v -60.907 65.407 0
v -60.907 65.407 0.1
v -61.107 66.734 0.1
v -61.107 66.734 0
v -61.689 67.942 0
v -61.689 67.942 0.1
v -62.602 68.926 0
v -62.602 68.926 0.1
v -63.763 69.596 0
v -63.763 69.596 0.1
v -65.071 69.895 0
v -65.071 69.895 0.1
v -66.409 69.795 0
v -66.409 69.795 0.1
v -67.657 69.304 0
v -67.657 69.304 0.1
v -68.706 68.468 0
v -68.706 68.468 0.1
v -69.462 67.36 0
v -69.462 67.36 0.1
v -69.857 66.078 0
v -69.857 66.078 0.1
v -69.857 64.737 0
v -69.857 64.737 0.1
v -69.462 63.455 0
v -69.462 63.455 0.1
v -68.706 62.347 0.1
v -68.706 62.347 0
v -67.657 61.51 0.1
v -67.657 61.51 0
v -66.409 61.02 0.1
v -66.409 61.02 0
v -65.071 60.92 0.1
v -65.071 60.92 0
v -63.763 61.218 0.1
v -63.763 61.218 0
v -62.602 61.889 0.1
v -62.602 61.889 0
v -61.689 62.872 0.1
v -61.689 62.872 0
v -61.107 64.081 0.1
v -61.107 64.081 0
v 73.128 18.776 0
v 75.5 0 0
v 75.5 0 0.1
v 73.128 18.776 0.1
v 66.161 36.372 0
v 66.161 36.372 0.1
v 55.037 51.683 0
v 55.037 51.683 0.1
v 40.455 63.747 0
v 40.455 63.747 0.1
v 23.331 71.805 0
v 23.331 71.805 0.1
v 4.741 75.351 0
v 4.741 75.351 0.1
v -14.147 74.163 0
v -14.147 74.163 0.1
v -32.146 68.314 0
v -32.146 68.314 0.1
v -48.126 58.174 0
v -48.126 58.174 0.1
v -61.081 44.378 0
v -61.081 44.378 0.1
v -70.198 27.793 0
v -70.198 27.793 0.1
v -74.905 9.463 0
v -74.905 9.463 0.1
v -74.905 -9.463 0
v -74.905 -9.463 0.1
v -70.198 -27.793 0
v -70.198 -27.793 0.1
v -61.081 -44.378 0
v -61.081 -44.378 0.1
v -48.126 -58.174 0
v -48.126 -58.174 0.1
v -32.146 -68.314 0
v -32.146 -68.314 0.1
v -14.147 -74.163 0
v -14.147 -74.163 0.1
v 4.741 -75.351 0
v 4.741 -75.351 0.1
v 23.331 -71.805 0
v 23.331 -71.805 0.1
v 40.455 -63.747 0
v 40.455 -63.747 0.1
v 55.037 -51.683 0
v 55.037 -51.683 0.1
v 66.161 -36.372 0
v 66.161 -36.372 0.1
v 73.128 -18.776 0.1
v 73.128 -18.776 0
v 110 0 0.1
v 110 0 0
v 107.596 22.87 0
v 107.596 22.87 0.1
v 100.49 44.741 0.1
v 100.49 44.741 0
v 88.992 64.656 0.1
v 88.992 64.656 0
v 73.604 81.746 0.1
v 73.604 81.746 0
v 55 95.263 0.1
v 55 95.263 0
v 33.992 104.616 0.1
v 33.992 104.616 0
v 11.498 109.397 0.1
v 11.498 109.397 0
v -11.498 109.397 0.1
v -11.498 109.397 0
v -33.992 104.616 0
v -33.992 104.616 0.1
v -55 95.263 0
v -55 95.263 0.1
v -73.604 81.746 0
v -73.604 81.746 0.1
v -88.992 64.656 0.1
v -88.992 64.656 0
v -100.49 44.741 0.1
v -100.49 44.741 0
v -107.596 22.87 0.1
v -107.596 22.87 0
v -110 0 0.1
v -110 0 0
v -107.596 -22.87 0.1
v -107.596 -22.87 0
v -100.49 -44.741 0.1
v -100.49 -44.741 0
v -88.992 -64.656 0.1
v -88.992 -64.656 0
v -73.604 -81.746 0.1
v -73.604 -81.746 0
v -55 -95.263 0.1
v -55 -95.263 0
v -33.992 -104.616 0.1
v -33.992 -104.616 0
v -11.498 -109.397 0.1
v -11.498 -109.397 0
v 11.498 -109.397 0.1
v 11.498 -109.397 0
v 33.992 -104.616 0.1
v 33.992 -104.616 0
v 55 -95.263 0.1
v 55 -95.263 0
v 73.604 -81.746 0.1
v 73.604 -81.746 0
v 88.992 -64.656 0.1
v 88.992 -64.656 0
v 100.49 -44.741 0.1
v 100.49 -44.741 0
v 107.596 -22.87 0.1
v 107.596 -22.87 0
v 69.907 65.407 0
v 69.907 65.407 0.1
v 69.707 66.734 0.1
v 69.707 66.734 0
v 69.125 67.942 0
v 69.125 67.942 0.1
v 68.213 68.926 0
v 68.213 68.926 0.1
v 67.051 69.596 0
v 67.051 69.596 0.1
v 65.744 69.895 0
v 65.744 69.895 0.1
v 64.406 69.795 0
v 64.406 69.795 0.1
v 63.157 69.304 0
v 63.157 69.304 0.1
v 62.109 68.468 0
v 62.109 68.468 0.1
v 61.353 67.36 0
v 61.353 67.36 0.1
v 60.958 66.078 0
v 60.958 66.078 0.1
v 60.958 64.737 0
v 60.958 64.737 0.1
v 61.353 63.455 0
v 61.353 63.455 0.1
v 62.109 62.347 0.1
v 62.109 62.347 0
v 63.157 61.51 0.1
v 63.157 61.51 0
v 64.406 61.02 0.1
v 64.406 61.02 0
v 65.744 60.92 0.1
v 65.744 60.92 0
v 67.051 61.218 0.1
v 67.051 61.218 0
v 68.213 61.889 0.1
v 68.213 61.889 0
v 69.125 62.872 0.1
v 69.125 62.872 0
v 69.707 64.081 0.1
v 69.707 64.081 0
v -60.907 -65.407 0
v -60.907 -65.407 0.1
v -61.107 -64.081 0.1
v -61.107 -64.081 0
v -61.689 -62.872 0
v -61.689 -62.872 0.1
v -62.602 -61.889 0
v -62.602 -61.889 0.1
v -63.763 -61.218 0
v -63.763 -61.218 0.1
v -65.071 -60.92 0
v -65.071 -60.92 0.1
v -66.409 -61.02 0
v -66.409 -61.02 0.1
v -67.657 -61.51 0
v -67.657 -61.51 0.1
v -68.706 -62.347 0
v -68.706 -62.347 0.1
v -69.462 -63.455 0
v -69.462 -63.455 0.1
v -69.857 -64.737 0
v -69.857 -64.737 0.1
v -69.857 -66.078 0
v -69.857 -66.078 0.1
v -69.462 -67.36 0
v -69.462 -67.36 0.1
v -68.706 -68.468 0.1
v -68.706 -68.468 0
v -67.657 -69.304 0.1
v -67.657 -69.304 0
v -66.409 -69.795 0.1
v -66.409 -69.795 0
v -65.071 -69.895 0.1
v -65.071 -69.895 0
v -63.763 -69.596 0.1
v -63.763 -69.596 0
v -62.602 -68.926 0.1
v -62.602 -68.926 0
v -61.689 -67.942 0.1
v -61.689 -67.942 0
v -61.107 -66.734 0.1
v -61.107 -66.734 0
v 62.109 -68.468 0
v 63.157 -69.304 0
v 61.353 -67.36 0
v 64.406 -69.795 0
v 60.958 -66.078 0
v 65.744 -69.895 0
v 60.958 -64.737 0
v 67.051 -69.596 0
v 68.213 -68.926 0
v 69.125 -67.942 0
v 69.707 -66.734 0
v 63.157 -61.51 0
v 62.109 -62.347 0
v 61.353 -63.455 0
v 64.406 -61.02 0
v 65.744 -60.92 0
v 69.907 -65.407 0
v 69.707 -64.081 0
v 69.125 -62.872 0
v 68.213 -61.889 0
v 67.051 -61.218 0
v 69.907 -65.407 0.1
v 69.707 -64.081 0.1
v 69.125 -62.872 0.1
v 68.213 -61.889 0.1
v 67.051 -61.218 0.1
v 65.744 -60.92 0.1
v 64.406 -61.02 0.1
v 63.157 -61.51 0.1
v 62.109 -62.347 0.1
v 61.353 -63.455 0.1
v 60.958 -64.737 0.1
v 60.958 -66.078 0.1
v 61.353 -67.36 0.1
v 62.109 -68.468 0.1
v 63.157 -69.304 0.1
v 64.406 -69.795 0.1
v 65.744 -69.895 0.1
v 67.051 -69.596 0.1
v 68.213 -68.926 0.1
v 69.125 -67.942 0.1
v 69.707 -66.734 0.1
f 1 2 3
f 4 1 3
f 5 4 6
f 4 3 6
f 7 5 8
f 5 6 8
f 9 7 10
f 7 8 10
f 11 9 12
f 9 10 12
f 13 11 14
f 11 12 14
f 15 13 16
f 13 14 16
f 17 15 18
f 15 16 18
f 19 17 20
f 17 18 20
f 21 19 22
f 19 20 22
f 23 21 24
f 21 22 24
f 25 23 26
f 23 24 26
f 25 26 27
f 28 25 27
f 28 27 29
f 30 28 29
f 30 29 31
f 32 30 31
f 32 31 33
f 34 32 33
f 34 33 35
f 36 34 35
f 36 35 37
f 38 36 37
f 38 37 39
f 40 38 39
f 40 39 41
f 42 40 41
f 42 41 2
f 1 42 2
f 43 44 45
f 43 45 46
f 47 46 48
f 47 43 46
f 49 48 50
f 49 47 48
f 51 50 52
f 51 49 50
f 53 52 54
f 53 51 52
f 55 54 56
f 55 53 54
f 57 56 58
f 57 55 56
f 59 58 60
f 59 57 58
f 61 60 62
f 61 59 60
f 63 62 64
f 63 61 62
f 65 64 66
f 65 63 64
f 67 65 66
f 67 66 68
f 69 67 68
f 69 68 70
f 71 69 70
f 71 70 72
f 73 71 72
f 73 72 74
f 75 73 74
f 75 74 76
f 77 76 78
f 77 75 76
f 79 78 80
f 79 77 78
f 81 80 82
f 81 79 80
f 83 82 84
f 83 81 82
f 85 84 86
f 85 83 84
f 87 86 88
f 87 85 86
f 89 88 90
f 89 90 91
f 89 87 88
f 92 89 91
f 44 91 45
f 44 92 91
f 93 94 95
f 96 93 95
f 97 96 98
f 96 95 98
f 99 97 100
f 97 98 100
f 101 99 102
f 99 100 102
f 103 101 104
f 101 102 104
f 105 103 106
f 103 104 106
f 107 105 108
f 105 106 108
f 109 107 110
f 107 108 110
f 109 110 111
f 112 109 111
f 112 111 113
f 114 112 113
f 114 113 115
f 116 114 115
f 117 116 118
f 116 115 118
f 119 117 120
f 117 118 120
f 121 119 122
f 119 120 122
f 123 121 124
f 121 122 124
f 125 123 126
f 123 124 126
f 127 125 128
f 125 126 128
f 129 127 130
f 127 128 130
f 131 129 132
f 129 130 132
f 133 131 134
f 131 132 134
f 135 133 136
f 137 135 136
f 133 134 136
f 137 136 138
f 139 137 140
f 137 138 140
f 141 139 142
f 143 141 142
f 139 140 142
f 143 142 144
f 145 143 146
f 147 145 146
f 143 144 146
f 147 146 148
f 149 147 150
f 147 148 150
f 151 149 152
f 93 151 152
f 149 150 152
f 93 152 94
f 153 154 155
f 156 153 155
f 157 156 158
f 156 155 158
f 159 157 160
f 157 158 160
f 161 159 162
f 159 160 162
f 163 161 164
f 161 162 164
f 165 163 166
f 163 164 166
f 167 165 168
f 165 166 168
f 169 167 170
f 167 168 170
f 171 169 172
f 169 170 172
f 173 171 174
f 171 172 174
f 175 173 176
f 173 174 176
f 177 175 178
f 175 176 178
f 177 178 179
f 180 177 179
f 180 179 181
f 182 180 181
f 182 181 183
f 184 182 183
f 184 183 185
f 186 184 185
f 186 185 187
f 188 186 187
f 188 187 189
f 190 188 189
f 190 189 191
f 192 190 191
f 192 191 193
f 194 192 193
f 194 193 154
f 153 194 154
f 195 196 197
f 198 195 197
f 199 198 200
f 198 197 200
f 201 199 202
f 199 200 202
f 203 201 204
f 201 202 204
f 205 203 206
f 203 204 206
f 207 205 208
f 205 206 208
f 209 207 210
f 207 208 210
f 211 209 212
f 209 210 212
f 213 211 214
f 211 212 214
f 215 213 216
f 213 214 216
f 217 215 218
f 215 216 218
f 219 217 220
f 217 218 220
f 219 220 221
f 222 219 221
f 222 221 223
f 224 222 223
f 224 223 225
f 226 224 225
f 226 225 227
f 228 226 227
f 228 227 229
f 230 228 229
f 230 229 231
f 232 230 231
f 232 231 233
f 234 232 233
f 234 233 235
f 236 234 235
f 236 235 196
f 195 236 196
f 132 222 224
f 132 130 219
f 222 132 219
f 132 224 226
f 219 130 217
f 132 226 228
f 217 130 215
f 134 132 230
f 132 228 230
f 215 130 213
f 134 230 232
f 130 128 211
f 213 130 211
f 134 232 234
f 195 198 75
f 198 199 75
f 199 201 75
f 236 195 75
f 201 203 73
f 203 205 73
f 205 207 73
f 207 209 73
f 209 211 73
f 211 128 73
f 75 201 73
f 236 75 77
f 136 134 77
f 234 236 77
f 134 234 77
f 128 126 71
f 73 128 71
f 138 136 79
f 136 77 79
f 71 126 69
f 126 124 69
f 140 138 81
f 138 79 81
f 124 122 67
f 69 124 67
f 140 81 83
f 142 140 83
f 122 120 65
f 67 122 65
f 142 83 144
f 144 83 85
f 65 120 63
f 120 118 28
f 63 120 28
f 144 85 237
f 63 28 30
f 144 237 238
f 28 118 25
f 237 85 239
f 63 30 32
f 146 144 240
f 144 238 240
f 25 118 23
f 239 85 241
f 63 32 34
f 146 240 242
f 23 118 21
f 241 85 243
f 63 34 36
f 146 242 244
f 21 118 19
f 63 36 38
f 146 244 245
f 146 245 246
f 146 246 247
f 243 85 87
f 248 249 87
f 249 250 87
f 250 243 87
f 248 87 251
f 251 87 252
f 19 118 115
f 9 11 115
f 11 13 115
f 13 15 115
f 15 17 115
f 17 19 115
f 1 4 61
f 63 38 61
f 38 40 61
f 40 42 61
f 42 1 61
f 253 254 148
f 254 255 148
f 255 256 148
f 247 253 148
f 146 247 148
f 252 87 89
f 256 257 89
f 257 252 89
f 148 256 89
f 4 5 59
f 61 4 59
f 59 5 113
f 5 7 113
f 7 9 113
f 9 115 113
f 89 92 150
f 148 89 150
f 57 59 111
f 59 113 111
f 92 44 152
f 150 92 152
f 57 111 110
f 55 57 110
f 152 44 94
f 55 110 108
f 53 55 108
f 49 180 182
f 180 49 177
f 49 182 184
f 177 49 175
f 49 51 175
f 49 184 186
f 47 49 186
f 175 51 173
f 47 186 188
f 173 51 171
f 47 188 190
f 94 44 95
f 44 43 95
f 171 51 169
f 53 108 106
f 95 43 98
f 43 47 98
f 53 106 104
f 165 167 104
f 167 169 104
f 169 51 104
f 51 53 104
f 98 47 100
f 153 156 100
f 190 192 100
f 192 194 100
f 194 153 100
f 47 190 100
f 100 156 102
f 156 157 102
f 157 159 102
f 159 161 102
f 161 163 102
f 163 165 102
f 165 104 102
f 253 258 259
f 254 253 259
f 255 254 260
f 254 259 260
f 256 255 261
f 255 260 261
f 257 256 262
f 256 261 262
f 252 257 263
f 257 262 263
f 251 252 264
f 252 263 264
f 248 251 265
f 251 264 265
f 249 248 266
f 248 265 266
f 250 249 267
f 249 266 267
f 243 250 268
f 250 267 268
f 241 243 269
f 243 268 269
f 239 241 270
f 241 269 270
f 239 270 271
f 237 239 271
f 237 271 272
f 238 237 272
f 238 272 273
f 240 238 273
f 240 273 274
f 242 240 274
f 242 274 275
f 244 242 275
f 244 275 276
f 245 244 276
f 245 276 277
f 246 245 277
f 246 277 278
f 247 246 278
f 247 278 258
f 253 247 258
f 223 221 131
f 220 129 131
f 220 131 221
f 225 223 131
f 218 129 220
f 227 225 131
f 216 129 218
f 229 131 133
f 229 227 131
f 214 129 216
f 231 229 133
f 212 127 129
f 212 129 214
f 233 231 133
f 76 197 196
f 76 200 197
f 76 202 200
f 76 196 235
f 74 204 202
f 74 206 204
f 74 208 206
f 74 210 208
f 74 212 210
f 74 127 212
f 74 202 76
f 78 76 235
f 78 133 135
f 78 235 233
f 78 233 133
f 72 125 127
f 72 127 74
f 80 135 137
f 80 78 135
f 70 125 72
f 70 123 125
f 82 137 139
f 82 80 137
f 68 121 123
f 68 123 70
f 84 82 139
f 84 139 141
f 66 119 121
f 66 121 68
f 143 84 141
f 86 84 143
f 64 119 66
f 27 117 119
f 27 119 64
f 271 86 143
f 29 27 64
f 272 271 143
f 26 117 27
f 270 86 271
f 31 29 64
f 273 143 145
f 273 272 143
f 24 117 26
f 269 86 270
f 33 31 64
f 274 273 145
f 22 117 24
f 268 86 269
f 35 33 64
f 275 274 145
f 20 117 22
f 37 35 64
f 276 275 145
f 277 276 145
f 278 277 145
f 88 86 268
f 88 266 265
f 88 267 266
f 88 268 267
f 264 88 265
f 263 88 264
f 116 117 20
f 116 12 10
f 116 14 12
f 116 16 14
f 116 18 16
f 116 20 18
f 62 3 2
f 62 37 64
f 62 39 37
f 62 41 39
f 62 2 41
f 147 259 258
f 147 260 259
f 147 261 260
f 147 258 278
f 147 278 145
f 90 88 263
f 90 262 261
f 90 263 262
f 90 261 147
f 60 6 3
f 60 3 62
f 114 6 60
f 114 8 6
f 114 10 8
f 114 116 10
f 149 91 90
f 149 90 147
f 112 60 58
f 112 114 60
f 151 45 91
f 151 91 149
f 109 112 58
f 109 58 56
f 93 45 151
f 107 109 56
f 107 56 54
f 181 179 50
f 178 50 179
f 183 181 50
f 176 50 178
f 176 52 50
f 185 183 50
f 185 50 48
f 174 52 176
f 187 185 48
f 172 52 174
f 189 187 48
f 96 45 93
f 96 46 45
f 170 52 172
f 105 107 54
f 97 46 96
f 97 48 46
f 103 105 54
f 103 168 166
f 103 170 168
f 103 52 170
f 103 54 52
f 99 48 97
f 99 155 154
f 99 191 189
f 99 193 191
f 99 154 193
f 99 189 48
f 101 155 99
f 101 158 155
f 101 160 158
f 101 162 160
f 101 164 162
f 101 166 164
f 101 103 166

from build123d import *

# Parameters (mm, degrees)
SCHIZZO1_R                   = 110
SCHIZZO1_R_2                 = 75.5
ESTRUSIONE_ESTRUSIONE1_DEPTH = 0.1
SCHIZZO3_R                   = 4.5
TAGLIO_ESTRUSIONE1_DEPTH     = 156.563524002


with BuildPart() as part:
    # Schizzo1 → Estrusione-Estrusione1 (new body)
    with BuildSketch(Plane.XY):
        Circle(SCHIZZO1_R)
        Circle(SCHIZZO1_R_2, mode=Mode.SUBTRACT)
    extrude(amount=ESTRUSIONE_ESTRUSIONE1_DEPTH)

    # Schizzo3 → Taglio-Estrusione1 (cut, through all)
    with BuildSketch(Plane.XY.offset(0.1)):
        with Locations((-65.40737726, 65.40737726)):
            Circle(SCHIZZO3_R)
        with Locations((65.40737726, 65.40737726)):
            Circle(SCHIZZO3_R)
        with Locations((65.40737726, -65.40737726)):
            Circle(SCHIZZO3_R)
        with Locations((-65.40737726, -65.40737726)):
            Circle(SCHIZZO3_R)
    extrude(amount=-TAGLIO_ESTRUSIONE1_DEPTH, mode=Mode.SUBTRACT)


solid = part.part
